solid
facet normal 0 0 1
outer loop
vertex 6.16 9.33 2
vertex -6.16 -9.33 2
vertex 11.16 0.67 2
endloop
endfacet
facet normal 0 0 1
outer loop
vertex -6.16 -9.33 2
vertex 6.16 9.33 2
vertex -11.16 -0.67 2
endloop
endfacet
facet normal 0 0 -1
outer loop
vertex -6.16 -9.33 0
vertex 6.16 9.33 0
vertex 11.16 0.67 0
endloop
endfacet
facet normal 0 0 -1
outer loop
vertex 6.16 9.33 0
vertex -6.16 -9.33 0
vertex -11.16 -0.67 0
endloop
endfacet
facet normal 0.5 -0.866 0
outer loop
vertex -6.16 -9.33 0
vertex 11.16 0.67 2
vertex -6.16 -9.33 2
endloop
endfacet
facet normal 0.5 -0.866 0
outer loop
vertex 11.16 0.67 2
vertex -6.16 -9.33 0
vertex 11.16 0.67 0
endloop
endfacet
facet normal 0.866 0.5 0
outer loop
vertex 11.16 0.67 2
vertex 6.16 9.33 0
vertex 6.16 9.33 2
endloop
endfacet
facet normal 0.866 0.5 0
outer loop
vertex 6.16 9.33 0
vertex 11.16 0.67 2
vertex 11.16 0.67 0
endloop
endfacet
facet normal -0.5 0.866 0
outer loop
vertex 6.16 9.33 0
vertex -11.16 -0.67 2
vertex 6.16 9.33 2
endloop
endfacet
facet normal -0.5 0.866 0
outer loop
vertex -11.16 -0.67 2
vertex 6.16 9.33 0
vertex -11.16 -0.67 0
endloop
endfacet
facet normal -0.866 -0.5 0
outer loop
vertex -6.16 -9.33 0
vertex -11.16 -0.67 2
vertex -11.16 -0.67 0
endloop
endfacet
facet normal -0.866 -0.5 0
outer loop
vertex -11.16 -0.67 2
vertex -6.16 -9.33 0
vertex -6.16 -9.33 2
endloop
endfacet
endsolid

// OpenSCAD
// Auto-generated from tests/data/feature_fixtures_manifest.json
// fixture: plate_plain_rotated_z30
// fixture_type: plate
// description: Plain plate rotated about Z to baseline non-axis-aligned behavior.
// transform: rotate=[0.000000, 0.000000, 30.000000], translate=[0.000000, 0.000000, 0.000000]
$fn = 96;

plate_size = [20.000000, 10.000000, 2.000000];
plate_origin = [-10.000000, -5.000000, 0.000000];

module through_hole(center, diameter, height) {
  translate(center) cylinder(d=diameter, h=height, center=false);
}

module through_slot(start, end, width, height) {
  hull() {
    through_hole(start, width, height);
    through_hole(end, width, height);
  }
}

module counterbore_hole(center, through_d, bore_d, bore_depth, plate_thickness) {
  translate([center[0], center[1], -0.1])
    cylinder(d=through_d, h=plate_thickness + 0.2, center=false);
  translate([center[0], center[1], plate_thickness - bore_depth])
    cylinder(d=bore_d, h=bore_depth + 0.1, center=false);
}

translate([0.000000, 0.000000, 0.000000])
rotate([0.000000, 0.000000, 30.000000]) {
difference() {
  translate(plate_origin) cube(plate_size);
}
}
